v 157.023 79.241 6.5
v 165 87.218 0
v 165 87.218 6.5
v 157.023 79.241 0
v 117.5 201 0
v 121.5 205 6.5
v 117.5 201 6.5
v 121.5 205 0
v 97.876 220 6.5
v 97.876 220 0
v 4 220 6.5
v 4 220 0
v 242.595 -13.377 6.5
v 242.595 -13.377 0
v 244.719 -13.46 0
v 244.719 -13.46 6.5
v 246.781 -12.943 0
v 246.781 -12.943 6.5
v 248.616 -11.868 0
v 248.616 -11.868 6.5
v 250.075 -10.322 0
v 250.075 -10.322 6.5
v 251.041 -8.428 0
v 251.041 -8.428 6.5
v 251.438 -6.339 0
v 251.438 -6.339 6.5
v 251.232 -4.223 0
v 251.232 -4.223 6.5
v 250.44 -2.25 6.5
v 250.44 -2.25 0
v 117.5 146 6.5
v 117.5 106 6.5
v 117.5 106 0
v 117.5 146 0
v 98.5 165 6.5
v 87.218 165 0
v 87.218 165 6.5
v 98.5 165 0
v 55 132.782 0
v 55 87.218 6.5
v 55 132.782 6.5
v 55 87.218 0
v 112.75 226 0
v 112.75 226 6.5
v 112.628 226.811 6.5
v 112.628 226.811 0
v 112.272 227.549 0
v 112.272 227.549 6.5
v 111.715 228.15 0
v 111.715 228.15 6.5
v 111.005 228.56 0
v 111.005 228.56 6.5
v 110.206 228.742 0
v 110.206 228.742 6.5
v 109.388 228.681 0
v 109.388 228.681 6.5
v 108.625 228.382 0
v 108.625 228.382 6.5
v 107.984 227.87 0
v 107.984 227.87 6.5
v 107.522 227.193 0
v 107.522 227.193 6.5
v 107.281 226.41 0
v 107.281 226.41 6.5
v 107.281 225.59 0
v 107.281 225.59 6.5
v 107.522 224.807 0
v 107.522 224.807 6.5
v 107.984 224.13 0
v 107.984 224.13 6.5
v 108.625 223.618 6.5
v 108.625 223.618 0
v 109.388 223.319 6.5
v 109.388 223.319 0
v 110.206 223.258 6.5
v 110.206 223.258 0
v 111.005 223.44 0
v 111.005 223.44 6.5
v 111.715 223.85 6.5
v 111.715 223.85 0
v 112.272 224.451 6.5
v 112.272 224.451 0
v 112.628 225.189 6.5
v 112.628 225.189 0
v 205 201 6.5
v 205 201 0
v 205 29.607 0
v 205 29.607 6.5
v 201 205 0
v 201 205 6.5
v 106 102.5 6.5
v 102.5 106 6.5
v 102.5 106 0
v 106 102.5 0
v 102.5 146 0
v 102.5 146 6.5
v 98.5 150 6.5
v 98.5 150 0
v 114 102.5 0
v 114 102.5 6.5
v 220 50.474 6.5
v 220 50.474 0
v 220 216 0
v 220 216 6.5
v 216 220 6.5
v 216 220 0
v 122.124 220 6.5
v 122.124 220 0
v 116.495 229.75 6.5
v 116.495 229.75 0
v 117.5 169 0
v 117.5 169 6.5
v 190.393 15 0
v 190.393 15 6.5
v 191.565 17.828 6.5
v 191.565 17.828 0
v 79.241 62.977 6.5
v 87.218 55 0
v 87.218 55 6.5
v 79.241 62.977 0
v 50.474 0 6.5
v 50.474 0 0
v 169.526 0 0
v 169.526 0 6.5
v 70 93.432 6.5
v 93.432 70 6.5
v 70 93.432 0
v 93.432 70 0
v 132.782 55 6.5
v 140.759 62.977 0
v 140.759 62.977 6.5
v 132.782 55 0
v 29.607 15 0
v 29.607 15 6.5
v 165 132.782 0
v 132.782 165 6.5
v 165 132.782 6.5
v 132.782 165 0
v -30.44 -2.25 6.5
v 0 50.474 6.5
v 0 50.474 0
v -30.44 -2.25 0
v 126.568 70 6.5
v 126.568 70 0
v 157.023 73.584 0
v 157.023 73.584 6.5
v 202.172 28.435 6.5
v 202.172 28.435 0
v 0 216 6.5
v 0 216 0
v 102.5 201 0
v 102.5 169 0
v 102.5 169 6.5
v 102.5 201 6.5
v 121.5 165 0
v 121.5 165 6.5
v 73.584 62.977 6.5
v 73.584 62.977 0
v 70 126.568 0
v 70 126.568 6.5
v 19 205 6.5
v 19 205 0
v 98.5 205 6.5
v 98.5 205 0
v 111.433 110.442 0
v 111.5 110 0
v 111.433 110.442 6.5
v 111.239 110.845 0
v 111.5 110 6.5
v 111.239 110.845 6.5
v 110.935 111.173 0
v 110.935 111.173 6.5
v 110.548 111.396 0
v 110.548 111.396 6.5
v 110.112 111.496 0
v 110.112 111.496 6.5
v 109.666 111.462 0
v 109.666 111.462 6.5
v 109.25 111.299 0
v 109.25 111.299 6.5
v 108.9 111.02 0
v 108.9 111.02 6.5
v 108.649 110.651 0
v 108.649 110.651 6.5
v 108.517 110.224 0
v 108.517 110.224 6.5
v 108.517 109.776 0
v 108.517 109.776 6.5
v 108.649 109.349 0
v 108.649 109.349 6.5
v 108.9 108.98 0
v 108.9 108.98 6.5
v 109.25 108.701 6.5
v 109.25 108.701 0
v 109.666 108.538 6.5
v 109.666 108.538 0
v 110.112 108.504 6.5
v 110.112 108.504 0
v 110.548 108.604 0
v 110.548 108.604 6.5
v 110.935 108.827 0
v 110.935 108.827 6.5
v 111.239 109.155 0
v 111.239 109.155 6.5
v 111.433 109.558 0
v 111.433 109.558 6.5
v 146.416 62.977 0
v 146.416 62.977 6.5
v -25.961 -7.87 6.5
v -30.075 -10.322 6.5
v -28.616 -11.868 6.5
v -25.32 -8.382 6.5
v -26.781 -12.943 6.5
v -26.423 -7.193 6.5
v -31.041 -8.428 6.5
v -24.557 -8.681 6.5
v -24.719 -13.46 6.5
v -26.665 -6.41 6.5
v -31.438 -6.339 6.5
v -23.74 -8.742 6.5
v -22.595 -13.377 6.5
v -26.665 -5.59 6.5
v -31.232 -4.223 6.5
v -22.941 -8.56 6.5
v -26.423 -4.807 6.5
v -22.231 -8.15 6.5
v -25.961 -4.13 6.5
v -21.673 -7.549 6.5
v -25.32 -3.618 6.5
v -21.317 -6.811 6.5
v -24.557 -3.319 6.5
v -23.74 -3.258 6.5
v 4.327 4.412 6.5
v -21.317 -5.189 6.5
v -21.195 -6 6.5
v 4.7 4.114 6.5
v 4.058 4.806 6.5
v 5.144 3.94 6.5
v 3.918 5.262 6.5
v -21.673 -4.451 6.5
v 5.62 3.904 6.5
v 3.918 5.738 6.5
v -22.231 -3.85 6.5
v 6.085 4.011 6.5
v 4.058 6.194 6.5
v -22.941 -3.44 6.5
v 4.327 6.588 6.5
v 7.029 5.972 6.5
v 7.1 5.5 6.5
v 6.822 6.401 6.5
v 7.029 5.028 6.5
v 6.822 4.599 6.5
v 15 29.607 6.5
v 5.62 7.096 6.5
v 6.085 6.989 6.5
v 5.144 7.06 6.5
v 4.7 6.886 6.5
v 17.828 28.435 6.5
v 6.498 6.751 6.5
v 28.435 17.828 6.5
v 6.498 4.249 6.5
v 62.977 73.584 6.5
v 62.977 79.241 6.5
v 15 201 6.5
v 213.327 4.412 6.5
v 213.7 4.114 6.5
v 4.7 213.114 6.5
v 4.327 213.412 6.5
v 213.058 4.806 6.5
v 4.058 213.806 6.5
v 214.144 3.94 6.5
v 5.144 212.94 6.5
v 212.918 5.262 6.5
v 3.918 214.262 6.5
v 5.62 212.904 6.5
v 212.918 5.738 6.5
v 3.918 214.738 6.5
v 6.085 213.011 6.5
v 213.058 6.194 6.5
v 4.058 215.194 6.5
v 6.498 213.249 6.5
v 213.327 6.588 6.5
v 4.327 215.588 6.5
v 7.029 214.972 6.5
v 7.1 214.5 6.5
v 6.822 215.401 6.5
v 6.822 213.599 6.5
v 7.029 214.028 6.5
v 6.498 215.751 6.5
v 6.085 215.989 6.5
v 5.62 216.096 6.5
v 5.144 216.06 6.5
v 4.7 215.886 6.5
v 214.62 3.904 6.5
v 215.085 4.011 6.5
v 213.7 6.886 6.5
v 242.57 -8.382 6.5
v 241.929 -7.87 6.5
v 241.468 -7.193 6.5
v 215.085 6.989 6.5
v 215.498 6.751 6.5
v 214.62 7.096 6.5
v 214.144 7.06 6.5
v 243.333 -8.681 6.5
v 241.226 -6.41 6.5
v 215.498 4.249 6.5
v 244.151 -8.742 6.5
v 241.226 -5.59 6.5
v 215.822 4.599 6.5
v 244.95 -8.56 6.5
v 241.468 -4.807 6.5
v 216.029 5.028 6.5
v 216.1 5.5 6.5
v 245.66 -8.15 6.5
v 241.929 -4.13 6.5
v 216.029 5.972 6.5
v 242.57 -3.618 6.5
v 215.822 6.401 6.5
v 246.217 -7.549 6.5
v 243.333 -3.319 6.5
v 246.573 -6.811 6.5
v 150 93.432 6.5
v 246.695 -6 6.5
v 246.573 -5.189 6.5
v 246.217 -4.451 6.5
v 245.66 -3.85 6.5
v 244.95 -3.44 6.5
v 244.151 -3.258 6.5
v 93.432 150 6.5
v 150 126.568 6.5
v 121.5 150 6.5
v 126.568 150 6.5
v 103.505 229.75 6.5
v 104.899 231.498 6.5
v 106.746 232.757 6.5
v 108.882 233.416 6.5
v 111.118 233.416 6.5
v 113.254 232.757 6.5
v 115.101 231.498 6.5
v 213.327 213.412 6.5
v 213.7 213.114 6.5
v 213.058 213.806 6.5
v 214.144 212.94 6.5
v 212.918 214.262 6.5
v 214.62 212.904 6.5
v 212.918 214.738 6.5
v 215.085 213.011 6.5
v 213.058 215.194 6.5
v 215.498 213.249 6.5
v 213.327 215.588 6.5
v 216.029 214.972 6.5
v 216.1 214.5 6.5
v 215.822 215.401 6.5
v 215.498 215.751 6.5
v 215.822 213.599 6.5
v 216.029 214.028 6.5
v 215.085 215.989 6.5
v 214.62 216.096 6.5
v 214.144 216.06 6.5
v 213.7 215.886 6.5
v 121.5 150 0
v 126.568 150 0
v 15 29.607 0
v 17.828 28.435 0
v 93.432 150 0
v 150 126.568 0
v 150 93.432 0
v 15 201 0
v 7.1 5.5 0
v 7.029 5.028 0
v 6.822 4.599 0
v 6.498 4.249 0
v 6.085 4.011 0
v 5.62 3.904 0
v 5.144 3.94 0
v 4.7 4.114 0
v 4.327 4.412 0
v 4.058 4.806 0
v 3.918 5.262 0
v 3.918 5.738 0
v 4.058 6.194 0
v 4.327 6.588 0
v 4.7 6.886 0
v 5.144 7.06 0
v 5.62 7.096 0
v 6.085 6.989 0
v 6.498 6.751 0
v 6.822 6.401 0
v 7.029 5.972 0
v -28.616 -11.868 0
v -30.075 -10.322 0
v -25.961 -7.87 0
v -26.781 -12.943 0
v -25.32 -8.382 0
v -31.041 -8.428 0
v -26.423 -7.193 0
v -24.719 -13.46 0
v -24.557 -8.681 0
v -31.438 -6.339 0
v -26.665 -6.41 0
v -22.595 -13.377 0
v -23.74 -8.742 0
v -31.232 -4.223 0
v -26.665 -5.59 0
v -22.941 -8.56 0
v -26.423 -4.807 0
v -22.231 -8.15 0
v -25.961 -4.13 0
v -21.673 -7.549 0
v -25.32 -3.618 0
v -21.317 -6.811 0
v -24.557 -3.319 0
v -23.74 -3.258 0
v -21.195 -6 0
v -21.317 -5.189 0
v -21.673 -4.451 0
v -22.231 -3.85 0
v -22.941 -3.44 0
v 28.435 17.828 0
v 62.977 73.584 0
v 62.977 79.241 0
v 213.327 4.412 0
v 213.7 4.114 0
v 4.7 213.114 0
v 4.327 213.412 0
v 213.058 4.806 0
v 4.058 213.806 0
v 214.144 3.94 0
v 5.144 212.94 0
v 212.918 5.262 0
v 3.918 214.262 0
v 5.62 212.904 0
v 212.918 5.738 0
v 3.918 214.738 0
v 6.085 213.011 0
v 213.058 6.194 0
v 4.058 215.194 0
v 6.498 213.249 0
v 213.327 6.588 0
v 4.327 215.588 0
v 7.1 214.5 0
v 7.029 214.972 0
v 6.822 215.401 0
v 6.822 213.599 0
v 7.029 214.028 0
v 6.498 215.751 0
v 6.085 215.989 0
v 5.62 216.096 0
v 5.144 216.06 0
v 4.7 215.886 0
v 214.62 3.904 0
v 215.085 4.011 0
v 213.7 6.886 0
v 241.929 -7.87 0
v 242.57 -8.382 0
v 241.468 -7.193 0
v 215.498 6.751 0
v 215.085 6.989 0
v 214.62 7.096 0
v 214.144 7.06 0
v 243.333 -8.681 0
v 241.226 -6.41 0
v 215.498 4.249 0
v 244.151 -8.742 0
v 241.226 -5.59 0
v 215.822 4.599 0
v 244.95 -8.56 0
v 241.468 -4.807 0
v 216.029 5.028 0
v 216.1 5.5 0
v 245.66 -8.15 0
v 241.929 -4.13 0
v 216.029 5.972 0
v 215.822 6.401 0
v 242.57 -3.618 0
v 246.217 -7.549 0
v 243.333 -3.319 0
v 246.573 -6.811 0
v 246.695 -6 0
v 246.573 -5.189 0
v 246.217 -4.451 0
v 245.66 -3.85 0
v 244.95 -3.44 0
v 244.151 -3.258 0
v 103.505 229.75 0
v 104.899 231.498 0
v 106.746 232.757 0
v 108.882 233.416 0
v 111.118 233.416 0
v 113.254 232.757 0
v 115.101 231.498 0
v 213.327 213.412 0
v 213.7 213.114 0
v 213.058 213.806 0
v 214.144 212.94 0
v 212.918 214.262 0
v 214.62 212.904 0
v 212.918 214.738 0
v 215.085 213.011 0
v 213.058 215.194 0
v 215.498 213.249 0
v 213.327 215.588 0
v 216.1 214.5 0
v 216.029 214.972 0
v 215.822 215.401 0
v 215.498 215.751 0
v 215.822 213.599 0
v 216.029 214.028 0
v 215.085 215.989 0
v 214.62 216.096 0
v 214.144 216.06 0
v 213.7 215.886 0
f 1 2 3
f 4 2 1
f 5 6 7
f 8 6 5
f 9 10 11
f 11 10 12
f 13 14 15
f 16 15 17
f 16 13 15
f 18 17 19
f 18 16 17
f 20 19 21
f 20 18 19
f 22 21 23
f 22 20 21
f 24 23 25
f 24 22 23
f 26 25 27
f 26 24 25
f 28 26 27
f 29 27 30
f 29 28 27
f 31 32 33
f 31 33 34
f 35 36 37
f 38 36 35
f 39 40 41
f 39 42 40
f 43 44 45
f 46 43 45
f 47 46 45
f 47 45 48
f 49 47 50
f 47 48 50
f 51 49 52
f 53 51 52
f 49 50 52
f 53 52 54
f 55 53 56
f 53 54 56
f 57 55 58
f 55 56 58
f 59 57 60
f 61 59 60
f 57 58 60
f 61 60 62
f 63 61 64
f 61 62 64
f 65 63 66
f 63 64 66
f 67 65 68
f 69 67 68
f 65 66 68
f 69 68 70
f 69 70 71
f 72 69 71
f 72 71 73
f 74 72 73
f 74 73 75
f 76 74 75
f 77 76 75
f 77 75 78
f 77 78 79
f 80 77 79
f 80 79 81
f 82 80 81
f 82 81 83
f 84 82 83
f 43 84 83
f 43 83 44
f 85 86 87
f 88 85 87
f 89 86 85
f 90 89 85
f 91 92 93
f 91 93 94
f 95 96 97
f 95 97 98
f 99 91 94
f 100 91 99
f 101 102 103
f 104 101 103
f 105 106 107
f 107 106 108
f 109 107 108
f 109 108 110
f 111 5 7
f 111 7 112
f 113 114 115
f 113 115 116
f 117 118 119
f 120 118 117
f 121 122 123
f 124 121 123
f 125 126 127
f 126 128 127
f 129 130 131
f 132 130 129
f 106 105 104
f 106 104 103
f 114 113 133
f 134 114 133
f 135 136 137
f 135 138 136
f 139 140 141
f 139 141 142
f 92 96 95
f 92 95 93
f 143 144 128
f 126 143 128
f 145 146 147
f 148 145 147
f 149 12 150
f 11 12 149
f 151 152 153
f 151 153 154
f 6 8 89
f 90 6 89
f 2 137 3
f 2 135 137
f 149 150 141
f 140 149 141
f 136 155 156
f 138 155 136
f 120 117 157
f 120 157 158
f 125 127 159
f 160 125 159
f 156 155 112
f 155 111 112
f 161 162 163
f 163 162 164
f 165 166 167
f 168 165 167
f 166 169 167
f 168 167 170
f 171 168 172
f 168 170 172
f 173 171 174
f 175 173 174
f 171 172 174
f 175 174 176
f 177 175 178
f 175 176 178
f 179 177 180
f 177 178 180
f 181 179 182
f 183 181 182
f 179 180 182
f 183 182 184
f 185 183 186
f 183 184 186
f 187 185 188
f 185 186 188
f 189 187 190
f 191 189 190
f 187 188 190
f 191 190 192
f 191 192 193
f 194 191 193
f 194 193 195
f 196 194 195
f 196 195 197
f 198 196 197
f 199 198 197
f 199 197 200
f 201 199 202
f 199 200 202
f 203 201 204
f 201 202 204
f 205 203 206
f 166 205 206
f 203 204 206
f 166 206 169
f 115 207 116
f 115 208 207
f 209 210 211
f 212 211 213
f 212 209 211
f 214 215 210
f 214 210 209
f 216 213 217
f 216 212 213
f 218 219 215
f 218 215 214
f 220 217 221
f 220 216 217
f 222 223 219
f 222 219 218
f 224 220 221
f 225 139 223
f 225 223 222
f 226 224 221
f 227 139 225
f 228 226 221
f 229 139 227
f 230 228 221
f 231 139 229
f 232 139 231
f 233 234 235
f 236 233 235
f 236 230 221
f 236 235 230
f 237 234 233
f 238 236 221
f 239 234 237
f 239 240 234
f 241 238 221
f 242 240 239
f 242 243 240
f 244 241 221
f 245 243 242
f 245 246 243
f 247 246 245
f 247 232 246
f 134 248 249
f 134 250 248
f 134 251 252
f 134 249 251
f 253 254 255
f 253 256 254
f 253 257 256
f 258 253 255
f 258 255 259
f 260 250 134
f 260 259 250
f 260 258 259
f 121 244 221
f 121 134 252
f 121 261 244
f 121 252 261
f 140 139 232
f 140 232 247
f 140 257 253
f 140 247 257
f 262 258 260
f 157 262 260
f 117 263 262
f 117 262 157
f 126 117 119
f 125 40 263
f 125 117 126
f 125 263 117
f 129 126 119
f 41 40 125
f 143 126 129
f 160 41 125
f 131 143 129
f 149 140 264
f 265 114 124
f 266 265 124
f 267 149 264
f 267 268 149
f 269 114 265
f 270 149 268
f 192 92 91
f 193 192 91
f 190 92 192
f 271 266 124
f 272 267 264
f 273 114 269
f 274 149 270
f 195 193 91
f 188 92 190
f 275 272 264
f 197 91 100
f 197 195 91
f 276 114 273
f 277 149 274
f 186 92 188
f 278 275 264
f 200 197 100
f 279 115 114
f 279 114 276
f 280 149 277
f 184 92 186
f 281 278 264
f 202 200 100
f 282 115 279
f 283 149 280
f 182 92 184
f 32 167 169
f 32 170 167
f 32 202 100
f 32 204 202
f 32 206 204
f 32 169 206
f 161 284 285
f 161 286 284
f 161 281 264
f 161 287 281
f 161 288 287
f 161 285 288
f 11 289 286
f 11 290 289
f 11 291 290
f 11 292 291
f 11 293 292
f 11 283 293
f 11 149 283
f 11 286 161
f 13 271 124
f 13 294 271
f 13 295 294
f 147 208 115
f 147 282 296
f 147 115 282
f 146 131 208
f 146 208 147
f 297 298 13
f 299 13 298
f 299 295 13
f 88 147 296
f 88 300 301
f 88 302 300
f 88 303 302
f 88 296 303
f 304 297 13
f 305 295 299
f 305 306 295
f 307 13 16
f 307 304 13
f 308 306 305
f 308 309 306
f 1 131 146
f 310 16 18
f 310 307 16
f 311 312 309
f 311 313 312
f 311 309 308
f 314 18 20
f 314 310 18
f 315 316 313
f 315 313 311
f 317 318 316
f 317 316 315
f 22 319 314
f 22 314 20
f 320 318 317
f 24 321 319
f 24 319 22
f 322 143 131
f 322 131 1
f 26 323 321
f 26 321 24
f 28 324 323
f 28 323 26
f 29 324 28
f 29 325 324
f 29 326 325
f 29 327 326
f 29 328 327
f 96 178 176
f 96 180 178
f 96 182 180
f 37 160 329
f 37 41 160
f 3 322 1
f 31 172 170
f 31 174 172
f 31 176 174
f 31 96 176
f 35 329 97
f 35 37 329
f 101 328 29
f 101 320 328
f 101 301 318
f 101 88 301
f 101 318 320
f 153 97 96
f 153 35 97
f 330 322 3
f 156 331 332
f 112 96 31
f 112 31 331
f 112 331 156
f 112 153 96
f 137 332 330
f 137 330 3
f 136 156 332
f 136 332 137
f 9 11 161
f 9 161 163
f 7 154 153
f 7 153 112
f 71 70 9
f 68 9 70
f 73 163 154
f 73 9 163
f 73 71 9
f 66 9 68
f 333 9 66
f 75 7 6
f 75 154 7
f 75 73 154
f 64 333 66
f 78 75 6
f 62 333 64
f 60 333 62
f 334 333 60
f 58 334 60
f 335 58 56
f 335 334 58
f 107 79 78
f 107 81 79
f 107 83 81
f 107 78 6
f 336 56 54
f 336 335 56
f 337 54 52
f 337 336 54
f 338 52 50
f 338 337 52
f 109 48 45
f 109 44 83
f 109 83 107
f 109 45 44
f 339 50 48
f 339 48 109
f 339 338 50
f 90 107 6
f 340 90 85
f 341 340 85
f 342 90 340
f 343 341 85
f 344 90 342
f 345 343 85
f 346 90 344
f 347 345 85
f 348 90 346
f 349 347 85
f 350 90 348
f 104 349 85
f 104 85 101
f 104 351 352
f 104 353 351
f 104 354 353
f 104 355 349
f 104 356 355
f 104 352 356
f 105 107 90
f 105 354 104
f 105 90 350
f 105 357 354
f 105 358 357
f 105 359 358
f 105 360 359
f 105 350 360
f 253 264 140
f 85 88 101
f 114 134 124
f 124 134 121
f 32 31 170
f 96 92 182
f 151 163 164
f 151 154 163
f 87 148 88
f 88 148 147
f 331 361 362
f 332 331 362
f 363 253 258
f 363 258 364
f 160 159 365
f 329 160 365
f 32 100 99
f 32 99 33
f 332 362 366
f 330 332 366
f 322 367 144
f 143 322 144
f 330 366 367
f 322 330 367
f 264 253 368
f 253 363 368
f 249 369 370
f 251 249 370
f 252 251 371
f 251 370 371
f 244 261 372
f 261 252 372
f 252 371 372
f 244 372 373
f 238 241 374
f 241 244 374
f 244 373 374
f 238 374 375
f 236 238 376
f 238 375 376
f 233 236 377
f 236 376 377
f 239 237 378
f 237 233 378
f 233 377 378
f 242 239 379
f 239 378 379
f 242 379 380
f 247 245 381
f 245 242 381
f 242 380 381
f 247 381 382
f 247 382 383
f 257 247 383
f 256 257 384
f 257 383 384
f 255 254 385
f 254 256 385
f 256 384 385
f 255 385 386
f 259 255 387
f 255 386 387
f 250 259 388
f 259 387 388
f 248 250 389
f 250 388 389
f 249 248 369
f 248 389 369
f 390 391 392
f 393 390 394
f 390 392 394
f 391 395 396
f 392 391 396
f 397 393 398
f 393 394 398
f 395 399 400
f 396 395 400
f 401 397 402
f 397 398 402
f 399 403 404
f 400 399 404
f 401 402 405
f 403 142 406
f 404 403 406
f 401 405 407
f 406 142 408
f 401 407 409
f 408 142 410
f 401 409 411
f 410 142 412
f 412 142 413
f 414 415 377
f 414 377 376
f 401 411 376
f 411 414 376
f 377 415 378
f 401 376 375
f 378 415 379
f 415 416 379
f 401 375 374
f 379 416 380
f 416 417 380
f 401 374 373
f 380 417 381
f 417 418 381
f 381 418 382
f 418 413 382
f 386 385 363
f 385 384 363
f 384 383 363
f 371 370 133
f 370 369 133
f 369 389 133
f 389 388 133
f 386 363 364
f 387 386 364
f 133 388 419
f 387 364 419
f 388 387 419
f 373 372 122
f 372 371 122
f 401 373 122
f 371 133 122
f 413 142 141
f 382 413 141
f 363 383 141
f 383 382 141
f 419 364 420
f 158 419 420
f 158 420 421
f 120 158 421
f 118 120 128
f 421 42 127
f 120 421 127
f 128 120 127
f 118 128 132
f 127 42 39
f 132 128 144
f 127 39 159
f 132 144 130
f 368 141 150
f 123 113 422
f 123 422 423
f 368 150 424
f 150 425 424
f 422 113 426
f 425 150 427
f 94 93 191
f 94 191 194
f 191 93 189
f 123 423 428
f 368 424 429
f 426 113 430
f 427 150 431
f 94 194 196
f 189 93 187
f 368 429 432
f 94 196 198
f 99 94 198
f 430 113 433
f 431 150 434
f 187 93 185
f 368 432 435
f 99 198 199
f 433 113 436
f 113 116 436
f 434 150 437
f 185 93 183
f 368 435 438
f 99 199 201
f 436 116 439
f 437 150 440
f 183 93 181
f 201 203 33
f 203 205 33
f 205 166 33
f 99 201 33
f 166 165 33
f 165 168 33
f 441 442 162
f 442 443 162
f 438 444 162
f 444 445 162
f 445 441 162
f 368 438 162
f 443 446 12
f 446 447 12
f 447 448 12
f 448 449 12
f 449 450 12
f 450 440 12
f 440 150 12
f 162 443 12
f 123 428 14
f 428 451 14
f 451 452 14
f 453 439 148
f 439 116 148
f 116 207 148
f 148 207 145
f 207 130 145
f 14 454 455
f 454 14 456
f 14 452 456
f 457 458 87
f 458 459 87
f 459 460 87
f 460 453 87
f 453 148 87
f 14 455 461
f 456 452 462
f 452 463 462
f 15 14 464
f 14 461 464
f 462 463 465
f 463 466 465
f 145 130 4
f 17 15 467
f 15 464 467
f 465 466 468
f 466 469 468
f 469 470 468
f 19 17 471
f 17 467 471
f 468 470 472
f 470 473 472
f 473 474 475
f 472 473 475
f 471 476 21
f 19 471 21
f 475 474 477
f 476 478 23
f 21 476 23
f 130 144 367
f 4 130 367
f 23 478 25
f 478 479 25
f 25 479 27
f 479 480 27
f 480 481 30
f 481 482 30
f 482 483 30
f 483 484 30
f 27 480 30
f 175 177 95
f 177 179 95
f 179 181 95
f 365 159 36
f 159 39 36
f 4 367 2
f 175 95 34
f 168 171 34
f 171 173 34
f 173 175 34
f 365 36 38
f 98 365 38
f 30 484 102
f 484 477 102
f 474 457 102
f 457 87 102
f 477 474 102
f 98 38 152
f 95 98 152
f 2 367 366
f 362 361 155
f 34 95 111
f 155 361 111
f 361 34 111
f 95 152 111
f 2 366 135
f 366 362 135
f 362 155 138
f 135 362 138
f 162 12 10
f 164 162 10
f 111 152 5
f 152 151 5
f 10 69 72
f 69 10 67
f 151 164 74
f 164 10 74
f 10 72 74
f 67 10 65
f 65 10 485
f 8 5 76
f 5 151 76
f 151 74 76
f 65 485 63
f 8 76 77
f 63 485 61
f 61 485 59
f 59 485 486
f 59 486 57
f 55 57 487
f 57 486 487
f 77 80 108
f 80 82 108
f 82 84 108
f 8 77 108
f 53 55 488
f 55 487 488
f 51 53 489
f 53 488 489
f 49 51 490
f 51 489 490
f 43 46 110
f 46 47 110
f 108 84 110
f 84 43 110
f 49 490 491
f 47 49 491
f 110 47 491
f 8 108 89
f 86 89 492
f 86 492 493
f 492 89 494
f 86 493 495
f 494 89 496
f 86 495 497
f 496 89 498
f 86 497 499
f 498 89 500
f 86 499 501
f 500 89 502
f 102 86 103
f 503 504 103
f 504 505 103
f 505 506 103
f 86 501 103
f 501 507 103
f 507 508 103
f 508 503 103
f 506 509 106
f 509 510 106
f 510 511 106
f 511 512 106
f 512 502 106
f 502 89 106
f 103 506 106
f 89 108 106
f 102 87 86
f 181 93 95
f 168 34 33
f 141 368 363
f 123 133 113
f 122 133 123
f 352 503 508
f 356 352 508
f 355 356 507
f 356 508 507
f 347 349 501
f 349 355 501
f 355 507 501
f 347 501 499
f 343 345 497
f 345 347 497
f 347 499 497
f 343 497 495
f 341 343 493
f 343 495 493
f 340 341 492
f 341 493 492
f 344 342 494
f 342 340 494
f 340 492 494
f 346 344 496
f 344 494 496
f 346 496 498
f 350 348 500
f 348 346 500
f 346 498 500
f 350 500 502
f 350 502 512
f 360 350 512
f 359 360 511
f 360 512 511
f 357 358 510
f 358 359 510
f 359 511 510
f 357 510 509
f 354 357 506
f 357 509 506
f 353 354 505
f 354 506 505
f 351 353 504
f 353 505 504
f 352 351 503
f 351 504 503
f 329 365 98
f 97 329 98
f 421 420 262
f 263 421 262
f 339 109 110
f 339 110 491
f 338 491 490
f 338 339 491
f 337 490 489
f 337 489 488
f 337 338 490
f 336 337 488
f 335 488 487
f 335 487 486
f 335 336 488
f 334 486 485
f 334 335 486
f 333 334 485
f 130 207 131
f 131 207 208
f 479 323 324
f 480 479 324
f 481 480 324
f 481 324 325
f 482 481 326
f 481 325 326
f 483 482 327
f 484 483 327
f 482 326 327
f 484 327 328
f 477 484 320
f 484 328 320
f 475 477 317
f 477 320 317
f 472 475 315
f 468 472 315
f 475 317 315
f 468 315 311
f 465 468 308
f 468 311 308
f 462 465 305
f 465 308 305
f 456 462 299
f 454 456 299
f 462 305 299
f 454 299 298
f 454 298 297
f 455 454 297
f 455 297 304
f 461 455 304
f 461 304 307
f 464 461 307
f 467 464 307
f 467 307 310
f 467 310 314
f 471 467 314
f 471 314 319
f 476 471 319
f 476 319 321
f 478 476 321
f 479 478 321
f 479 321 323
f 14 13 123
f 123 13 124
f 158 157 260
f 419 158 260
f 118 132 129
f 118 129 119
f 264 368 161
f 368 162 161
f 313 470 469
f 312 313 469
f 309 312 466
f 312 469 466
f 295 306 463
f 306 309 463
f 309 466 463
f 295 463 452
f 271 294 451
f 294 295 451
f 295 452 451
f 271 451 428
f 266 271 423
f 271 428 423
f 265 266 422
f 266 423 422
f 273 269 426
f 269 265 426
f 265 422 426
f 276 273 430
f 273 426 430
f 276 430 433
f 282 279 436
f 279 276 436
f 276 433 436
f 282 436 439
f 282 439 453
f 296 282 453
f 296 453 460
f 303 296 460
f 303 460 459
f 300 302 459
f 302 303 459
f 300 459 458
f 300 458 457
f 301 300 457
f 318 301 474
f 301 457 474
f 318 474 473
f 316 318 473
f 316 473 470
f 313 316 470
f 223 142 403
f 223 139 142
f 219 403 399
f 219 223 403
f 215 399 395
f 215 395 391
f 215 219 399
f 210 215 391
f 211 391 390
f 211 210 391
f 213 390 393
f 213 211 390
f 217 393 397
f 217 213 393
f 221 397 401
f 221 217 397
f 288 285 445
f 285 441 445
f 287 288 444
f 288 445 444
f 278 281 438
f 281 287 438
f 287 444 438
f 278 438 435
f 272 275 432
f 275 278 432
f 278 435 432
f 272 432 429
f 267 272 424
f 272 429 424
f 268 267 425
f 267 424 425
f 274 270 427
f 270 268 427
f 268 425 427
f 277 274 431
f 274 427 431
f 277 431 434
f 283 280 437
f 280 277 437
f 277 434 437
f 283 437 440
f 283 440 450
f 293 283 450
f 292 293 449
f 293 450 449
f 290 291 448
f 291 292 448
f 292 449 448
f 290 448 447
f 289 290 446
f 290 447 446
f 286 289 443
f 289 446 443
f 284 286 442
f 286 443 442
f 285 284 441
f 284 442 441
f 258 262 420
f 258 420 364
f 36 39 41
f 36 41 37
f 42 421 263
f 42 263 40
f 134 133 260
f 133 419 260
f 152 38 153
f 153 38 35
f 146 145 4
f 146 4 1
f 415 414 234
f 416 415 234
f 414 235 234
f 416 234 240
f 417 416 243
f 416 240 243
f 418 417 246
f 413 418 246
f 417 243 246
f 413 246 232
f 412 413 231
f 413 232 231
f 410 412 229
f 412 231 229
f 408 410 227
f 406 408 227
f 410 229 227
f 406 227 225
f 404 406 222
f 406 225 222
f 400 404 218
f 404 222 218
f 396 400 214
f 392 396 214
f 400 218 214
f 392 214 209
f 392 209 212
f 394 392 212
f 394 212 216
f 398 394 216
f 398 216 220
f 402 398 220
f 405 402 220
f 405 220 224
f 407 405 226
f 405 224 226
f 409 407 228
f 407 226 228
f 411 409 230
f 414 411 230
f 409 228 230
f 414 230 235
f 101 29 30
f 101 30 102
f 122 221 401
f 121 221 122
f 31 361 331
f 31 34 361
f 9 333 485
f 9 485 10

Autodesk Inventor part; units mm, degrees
ref_plane "YZ Plane" through (0, 0, 0) normal (1, 0, 0) x (0, 1, 0)
ref_plane "XZ Plane" through (0, 0, 0) normal (0, 1, 0) x (-1, 0, 0)
ref_plane "XY Plane" through (0, 0, 0) normal (0, 0, 1) x (1, 0, 0)
sketch "Sketch1" plane through (0, 0, 0) normal (0, 0, 1) x (1, 0, 0)
  line L0 (0, 0) -> (220, 0)
  line L1 (220, 0) -> (220, 220)
  line L2 (220, 220) -> (0, 220)
  line L3 (0, 220) -> (0, 0)
  line L4 (5.5, 214.5) -> (214.5, 214.5) construction
  line L5 (214.5, 214.5) -> (214.5, 5.5) construction
  line L6 (214.5, 5.5) -> (5.5, 5.5) construction
  line L7 (5.5, 5.5) -> (5.5, 214.5) construction
  circle A0 centre (5.5, 5.5) radius 1.6
  circle A1 centre (5.5, 214.5) radius 1.6
  circle A2 centre (214.5, 214.5) radius 1.6
  circle A3 centre (214.5, 5.5) radius 1.6
  line L8 (165, 87.2183) -> (132.7817, 55)
  line L9 (132.7817, 55) -> (87.2183, 55)
  line L10 (87.2183, 55) -> (55, 87.2183)
  line L11 (55, 87.2183) -> (55, 132.7817)
  line L12 (55, 132.7817) -> (87.2183, 165)
  line L13 (132.7817, 165) -> (165, 132.7817)
  line L14 (165, 132.7817) -> (165, 87.2183)
  line L15 (150, 126.5685) -> (150, 93.4315)
  line L16 (150, 93.4315) -> (126.5685, 70)
  line L17 (126.5685, 70) -> (93.4315, 70)
  line L18 (93.4315, 70) -> (70, 93.4315)
  line L19 (70, 93.4315) -> (70, 126.5685)
  line L20 (70, 126.5685) -> (93.4315, 150)
  line L21 (93.4315, 150) -> (126.5685, 150)
  line L22 (126.5685, 150) -> (150, 126.5685)
  line L23 (205, 205) -> (205, 15)
  line L24 (205, 15) -> (15, 15)
  line L25 (15, 15) -> (15, 205)
  line L26 (102.5, 165) -> (102.5, 205)
  line L27 (117.5, 205) -> (117.5, 165)
  line L28 (15, 205) -> (102.5, 205)
  line L29 (117.5, 205) -> (205, 205)
  line L30 (87.2183, 165) -> (102.5, 165)
  line L31 (117.5, 165) -> (132.7817, 165)
  point P0 (214.5, 110)
  point P1 (220, 110)
  point P2 (110, 214.5)
  point P3 (110, 220)
  point P4 (110, 110)
  point P5 (110, 110)
  dimension "d0" = 220
  dimension "d1" = 220
  dimension "d2" = 209
  dimension "d3" = 209
  dimension "d4" = 3.2
  dimension "d5" = 3.2
  dimension "d6" = 3.2
  dimension "d7" = 3.2
  dimension "d9" = 15
  dimension "d10" = 15
  dimension "d11" = 15
  dimension "d12" = 15
  dimension "d13" = 15
  dimension "d14" = 80
  dimension "d15" = 7.5
extrude "Extrusion1" add sketch "Sketch1" along normal blind 6.5
sketch "Sketch2" plane through (0, 0, 6.5) normal (0, 0, 1) x (1, 0, 0)
  line L0 (205, 205) -> (205, 15) projected
  line L1 (205, 15) -> (15, 15) projected
  line L2 (15, 15) -> (15, 205) projected
  line L3 (55, 87.2183) -> (87.2183, 55) projected
  line L4 (132.7817, 55) -> (165, 87.2183) projected
  line L5 (0, 220) -> (0, 0) projected
  line L6 (65.8058, 76.4124) -> (15, 25.6066)
  line L7 (76.4124, 65.8058) -> (25.6066, 15)
  line L8 (143.5876, 65.8058) -> (194.3934, 15)
  line L9 (154.1942, 76.4124) -> (205, 25.6066)
  line L10 (205, 25.6066) -> (205, 15)
  line L11 (205, 15) -> (194.3934, 15)
  line L12 (15, 25.6066) -> (15, 15)
  line L13 (15, 15) -> (25.6066, 15)
  line L14 (15, 15) -> (71.1091, 71.1091) construction
  line L15 (148.8909, 71.1091) -> (205, 15) construction
  line L16 (65.8058, 76.4124) -> (76.4124, 65.8058)
  line L17 (143.5876, 65.8058) -> (154.1942, 76.4124)
  dimension "d18" = 15
  dimension "d19" = 15
  dimension "d20" = 7.5
  dimension "d21" = 7.5
extrude "Extrusion2" add sketch "Sketch2" against normal blind 6.5
sketch "Sketch4" plane through (0, 0, 6.5) normal (0, 0, 1) x (1, 0, 0)
  line L0 (93.4315, 150) -> (126.5685, 150) projected
  line L1 (0, 0) -> (220, 0) projected
  line L2 (220, 0) -> (220, 220) projected
  line L3 (220, 220) -> (0, 220) projected
  line L4 (0, 220) -> (0, 0) projected
  line L5 (-23.9453, -6) -> (243.9453, -6) construction
  line L6 (-23.9453, -6) -> (110, 226) construction
  line L7 (110, 226) -> (243.9453, -6) construction
  circle A0 centre (110, 226) radius 2.75
  circle A1 centre (243.9453, -6) radius 2.75
  circle A2 centre (-23.9453, -6) radius 2.75
  arc A3 (-30.4405, -2.25) -> (-22.5946, -13.3774) centre (-23.9453, -6) ccw
  arc A4 (116.4952, 229.75) -> (103.5048, 229.75) centre (110, 226) ccw
  arc A5 (242.5946, -13.3774) -> (250.4405, -2.25) centre (243.9453, -6) ccw
  line L8 (122.1244, 220) -> (116.4952, 229.75)
  line L9 (103.5048, 229.75) -> (97.8756, 220)
  line L10 (0, 50.4744) -> (-30.4405, -2.25)
  line L11 (250.4405, -2.25) -> (220, 50.4744)
  line L12 (242.5946, -13.3774) -> (169.5256, 0)
  line L13 (-22.5946, -13.3774) -> (50.4744, 0)
  line L14 (0, 50.4744) -> (0, 0)
  line L15 (0, 0) -> (50.4744, 0)
  line L16 (169.5256, 0) -> (220, 0)
  line L17 (220, 50.4744) -> (220, 0)
  point P0 (110, 150)
  dimension "d30" = 5.5
  dimension "d31" = 5.5
  dimension "d32" = 5.5
  dimension "d33" = 15
  dimension "d34" = 15
  dimension "d35" = 15
  dimension "d36" = 6
  dimension "d37" = 6
extrude "Extrusion3" add sketch "Sketch4" against normal blind 6.5 contours L1 L13 A3 L10 L4 | L1 L2 L11 A5 L12 | L9 A4 L8 L3
chamfer "Chamfer1" distance 4 angle 45 16 edges at (25.6066, 15, 3.25) (15, 25.6066, 3.25) (76.4124, 65.8058, 3.25) (65.8058, 76.4124, 3.25) (194.3934, 15, 3.25) (205, 25.6066, 3.25) (143.5876, 65.8058, 3.25) (154.1942, 76.4124, 3.25) (117.5, 205, 3.25) (102.5, 205, 3.25) (117.5, 165, 3.25) (102.5, 165, 3.25) (205, 205, 3.25) (15, 205, 3.25) (0, 220, 3.25) (220, 220, 3.25)
sketch "Sketch5" plane through (0, 0, 6.5) normal (0, 0, 1) x (1, 0, 0)
  line L0 (117.5, 169) -> (117.5, 201) projected
  line L1 (28.435, 17.8284) -> (29.6066, 15) projected
  line L2 (15, 29.6066) -> (17.8284, 28.435) projected
  line L3 (102.5, 201) -> (102.5, 169) projected
  line L4 (93.4315, 150) -> (126.5685, 150) projected
  line L5 (0, 216) -> (4, 220) projected
  line L6 (220, 50.4744) -> (220, 216) projected
  line L7 (70, 126.5685) -> (150, 93.4315) construction
  line L8 (150, 126.5685) -> (70, 93.4315) construction
  line L9 (102.5, 150) -> (102.5, 106)
  line L10 (102.5, 106) -> (106, 102.5)
  line L11 (106, 102.5) -> (114, 102.5)
  line L12 (114, 102.5) -> (117.5, 106)
  line L13 (117.5, 106) -> (117.5, 150)
  circle A0 centre (110, 110) radius 1.5
  point P0 (0, 0)
  dimension "d43" = 3
  dimension "d44" = 8
  dimension "d45" = 7.5
  dimension "d46" = 7.5
extrude "Extrusion4" add sketch "Sketch5" against normal blind 6.5
chamfer "Chamfer2" distance 4 angle 45 2 edges at (102.5, 150, 3.25) (117.5, 150, 3.25)
equation "\"d5\" = d4"
equation "\"d6\" = d4"
equation "\"d7\" = d4"
equation "\"d31\" = d30"
equation "\"d32\" = d30"
equation "\"d34\" = d33"
equation "\"d35\" = d33"
equation "\"d46\" = d45"
properties part number "heatbed_mount_v3"
